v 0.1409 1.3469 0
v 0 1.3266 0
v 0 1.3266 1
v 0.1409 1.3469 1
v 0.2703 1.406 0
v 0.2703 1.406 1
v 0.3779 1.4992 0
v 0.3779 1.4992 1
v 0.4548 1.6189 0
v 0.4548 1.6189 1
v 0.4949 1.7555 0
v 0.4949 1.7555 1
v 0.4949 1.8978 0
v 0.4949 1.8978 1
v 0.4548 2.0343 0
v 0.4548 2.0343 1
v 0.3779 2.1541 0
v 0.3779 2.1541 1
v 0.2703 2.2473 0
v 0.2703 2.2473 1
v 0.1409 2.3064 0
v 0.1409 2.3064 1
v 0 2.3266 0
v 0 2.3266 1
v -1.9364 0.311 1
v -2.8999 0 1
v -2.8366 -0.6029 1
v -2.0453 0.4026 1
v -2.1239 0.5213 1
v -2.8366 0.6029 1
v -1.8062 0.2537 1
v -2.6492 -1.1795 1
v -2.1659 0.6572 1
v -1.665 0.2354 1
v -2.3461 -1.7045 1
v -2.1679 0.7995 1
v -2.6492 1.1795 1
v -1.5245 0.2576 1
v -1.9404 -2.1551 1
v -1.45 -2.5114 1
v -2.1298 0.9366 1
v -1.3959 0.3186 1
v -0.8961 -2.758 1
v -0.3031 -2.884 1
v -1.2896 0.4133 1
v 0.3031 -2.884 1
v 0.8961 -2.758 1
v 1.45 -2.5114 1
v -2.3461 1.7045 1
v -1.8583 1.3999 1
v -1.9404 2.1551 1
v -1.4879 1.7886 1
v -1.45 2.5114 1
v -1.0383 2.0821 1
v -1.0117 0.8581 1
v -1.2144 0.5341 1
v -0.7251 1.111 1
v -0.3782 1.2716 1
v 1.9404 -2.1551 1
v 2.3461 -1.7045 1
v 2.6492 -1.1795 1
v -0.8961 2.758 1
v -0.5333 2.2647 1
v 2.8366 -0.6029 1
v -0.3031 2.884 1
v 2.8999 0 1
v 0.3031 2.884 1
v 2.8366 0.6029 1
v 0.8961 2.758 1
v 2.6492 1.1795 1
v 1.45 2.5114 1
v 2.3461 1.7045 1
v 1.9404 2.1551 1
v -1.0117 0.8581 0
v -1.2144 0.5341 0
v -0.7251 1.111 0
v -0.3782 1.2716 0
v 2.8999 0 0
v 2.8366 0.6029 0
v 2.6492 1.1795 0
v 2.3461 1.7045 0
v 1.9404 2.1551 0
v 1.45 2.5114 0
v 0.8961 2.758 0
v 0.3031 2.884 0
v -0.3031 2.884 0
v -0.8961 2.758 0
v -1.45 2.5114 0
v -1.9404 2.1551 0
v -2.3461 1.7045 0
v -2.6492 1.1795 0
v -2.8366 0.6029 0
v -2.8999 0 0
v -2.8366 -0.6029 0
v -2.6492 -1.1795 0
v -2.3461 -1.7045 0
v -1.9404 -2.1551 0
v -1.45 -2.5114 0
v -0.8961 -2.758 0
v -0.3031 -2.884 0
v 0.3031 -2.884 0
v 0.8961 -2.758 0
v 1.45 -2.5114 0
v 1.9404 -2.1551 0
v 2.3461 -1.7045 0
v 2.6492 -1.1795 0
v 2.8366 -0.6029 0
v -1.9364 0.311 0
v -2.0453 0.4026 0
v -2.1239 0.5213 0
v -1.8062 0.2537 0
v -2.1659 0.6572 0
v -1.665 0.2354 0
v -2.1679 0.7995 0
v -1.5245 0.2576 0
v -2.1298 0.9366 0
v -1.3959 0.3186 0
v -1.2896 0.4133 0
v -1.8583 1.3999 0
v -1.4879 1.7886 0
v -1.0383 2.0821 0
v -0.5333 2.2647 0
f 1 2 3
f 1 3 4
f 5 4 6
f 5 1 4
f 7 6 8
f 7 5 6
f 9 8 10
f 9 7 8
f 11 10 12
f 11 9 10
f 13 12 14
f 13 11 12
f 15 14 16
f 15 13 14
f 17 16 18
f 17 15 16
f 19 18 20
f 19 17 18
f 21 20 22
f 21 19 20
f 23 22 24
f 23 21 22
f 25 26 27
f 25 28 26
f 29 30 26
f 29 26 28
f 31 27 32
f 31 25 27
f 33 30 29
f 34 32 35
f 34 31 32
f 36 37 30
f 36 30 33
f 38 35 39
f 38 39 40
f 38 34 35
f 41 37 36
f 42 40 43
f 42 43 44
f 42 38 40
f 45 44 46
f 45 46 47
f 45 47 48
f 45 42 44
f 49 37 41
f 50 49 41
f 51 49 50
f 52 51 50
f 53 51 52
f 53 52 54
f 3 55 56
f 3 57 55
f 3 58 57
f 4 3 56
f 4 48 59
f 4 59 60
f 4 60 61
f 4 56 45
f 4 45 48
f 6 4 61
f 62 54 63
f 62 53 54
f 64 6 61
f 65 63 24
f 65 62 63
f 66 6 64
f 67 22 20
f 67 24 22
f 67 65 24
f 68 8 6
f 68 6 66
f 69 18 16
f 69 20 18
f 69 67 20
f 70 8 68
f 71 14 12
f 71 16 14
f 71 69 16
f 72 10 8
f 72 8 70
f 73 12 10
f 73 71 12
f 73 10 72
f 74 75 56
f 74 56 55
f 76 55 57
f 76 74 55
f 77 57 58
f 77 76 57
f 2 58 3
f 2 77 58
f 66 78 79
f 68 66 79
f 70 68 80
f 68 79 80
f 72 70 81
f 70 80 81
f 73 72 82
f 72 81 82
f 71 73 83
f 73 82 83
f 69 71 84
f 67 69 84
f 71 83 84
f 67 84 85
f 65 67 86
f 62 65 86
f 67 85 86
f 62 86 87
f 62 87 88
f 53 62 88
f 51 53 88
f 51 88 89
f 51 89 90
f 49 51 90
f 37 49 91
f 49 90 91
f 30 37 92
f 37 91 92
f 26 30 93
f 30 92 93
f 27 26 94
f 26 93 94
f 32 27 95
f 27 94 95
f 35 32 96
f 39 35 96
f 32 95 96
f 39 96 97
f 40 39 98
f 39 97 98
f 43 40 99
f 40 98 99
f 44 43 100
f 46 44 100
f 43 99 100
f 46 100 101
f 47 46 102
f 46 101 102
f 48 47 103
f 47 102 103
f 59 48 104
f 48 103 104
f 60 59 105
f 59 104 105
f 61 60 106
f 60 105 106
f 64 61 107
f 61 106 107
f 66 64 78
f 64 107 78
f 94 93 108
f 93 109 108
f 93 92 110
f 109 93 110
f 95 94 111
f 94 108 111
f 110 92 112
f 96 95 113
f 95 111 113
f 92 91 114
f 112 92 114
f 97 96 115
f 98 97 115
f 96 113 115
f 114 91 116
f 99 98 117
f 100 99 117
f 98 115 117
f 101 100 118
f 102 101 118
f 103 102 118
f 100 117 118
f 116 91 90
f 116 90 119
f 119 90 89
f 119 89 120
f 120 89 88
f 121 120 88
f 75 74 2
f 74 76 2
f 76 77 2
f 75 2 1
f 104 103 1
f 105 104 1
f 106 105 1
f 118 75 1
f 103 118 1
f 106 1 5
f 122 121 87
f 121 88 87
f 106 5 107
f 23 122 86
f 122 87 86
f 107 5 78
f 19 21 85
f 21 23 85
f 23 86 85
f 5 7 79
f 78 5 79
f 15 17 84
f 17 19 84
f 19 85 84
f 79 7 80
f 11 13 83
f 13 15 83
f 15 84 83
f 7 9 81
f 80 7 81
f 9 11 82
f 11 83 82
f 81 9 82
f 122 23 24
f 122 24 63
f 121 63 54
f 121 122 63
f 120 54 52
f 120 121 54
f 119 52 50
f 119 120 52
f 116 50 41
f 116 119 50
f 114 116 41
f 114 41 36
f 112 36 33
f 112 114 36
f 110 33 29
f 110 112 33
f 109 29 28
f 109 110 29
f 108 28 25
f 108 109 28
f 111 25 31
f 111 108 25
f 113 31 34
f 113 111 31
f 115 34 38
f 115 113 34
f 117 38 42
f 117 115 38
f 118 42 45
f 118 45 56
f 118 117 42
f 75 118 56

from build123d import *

# Parameters (mm, degrees)
SKETCH_1_R      = 2.899935842
EXTRUDE_1_DEPTH = 1


with BuildPart() as part:
    # 草圖1 → 填料-伸長1 (new body)
    with BuildSketch(Plane.XY):
        Circle(SKETCH_1_R)
        with BuildLine():
            ThreePointArc((0, 2.326630403), (-1.271608832, 1.94838908), (-2.129765657, 0.936646827))
            ThreePointArc((-2.129765657, 0.936646827), (-1.873360766, 0.277665392), (-1.21437933, 0.534070283))
            ThreePointArc((-1.21437933, 0.534070283), (-0.725063566, 1.110959518), (0, 1.326630403))
            ThreePointArc((0, 1.326630403), (0.5, 1.826630403), (0, 2.326630403))
        make_face(mode=Mode.SUBTRACT)
    extrude(amount=EXTRUDE_1_DEPTH)


solid = part.part
